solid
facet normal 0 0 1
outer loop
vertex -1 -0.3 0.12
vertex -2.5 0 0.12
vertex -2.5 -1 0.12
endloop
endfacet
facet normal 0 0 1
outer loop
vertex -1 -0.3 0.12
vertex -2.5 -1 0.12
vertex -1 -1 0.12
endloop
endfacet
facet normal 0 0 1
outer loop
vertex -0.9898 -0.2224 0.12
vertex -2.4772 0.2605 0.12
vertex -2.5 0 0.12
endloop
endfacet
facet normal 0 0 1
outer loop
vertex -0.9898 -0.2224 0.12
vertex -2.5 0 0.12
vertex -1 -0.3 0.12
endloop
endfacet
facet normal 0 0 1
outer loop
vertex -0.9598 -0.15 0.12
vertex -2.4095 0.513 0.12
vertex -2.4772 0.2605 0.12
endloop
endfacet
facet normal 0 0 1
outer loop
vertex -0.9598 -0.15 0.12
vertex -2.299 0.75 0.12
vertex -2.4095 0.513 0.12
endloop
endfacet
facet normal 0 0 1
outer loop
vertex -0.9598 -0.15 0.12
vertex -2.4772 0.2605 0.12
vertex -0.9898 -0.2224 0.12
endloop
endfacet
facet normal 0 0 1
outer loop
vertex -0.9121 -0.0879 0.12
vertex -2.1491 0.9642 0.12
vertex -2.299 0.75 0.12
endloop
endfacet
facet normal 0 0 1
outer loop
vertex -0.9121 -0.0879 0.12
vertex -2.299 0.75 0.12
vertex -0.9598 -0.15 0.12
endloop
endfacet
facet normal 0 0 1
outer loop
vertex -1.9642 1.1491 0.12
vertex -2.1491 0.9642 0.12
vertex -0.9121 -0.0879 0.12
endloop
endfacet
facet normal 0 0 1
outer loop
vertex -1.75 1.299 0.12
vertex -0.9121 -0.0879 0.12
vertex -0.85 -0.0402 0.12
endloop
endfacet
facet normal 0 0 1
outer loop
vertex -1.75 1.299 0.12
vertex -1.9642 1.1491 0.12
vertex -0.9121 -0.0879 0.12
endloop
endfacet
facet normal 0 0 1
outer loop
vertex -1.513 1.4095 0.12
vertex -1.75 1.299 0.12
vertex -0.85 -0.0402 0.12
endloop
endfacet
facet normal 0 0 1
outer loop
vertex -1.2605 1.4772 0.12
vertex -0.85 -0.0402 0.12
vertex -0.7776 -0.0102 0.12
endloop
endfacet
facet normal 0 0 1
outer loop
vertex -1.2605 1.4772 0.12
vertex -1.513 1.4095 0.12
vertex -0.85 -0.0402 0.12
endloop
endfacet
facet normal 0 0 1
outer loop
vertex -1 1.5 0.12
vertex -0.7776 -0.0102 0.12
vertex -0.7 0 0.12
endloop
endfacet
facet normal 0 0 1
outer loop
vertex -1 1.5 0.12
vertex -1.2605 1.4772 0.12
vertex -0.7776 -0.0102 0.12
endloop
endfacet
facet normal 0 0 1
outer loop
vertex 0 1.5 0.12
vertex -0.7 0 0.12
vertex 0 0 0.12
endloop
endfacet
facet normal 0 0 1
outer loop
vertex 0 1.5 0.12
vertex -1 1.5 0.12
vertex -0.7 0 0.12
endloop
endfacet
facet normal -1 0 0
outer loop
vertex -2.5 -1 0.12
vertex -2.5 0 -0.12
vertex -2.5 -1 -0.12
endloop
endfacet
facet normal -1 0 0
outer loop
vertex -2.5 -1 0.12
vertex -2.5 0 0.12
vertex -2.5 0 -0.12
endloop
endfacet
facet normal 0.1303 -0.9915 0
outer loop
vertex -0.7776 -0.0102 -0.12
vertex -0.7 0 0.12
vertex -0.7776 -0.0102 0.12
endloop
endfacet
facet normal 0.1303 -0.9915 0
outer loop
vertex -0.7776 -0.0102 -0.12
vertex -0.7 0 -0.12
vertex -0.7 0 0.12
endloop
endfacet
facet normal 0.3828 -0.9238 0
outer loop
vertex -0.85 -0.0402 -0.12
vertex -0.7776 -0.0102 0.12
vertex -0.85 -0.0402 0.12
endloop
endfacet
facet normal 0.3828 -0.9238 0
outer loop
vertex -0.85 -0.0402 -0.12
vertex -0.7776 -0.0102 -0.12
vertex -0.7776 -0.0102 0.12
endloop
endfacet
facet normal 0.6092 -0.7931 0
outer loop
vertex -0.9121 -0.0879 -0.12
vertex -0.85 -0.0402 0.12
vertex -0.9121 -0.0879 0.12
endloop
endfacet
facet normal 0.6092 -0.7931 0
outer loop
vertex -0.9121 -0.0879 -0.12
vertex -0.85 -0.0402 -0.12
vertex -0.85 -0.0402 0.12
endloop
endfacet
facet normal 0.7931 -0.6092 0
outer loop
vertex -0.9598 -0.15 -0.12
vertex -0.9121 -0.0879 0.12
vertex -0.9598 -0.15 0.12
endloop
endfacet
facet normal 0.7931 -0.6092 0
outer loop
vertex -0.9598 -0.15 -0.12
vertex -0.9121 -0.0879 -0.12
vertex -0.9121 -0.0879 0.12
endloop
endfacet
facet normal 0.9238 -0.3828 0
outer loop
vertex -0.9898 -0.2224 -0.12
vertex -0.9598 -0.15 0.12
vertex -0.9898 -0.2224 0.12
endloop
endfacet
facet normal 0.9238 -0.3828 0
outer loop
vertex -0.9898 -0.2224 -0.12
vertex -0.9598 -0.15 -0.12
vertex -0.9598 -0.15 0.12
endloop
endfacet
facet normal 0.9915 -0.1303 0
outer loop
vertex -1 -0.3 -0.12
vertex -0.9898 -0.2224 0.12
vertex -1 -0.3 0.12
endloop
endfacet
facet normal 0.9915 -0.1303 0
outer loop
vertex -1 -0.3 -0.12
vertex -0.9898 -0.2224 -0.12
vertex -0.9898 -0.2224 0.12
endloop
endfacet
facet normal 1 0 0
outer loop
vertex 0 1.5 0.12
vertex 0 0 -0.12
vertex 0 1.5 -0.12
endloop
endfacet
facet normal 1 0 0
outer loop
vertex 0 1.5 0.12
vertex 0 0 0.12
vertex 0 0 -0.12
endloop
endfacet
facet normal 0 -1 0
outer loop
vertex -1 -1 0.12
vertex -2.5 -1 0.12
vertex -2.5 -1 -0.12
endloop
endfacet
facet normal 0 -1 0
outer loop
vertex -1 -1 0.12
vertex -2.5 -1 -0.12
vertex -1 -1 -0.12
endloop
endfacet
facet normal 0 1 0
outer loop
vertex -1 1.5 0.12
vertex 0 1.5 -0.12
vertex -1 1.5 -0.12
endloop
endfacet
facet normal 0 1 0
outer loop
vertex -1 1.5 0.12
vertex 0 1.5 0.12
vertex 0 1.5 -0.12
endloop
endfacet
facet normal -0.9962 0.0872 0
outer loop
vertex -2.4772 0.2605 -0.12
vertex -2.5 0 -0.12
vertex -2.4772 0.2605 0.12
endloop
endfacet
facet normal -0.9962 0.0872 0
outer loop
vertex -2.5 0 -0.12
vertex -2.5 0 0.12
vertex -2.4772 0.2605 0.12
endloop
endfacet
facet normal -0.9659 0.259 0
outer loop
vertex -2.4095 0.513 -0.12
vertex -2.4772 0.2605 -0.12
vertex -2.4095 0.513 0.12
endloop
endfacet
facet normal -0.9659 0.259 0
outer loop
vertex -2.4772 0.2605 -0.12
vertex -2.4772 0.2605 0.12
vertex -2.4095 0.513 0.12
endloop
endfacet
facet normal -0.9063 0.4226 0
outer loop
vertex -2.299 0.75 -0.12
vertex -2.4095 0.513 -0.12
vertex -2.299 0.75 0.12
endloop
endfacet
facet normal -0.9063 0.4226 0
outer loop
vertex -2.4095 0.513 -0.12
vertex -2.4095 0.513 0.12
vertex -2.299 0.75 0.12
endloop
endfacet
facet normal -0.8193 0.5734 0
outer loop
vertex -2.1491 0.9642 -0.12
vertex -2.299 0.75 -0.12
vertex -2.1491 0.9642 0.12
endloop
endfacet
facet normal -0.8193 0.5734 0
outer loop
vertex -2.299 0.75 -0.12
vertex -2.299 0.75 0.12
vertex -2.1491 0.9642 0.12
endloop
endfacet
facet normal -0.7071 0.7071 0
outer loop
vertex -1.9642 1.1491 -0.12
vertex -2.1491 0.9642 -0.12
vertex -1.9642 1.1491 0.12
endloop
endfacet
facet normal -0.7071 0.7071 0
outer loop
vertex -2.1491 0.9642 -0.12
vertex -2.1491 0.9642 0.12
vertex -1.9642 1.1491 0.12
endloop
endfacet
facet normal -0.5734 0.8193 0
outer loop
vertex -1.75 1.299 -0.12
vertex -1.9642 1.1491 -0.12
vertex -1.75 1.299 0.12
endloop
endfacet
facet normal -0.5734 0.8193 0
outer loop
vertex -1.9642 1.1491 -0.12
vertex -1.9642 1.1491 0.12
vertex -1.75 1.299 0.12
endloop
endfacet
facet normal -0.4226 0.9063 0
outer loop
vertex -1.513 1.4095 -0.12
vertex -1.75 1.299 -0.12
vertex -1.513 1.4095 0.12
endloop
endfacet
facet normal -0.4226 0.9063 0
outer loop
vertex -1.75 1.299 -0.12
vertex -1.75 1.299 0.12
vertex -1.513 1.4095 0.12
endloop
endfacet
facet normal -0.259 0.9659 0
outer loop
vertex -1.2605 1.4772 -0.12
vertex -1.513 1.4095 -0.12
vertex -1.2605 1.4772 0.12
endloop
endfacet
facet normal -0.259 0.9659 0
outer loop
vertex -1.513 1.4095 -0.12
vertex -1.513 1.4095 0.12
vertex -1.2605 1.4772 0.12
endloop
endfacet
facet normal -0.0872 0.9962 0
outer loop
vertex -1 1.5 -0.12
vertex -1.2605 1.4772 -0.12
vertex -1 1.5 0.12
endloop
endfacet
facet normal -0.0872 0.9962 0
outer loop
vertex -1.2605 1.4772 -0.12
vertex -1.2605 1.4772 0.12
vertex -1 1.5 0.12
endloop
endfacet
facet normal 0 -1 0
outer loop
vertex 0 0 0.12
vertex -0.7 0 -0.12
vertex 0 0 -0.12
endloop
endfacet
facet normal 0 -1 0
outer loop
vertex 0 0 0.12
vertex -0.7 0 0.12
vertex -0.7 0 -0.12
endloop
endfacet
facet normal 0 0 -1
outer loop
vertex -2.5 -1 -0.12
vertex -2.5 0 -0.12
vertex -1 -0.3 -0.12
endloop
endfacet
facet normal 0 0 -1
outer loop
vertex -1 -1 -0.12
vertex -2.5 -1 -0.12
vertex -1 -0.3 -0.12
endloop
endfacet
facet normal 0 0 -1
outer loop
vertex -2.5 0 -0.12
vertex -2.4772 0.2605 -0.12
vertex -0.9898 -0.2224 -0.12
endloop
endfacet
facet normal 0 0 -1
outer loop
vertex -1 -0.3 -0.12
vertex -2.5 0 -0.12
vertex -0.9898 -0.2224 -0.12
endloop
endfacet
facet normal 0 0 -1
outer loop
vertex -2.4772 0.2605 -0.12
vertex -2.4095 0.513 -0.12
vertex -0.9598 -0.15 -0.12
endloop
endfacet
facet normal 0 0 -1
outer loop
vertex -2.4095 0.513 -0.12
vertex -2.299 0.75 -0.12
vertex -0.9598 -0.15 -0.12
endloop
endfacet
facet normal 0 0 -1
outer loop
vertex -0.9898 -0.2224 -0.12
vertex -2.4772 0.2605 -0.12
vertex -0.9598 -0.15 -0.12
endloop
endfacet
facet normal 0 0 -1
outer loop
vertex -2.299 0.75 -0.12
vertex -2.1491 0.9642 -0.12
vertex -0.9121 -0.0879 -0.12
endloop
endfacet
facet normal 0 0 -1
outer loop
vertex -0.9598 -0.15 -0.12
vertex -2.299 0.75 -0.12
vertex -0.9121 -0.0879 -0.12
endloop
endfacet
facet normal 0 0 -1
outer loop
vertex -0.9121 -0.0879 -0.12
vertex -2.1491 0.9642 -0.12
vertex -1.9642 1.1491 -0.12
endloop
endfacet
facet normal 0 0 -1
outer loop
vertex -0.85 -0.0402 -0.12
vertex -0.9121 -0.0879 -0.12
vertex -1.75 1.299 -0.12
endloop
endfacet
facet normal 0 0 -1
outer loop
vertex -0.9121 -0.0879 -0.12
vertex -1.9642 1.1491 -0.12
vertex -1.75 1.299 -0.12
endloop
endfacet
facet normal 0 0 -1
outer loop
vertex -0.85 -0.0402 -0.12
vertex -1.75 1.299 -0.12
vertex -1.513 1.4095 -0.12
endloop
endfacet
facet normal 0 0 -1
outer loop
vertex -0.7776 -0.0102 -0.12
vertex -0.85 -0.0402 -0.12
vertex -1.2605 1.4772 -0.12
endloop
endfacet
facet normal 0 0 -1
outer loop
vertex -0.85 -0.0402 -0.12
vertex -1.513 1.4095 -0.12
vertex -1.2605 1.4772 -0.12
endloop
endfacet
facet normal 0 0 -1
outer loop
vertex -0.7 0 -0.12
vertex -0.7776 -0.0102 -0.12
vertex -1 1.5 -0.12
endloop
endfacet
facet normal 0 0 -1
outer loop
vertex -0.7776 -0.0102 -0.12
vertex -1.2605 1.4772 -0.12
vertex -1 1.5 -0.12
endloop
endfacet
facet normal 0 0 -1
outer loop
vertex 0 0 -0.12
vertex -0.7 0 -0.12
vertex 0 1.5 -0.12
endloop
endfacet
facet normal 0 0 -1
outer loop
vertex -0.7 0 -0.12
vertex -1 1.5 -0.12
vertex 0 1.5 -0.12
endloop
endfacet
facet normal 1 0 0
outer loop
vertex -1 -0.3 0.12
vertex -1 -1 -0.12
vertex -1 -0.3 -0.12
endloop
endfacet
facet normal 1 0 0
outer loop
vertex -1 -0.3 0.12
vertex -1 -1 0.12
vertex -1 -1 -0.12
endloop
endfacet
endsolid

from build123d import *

# Parameters (mm, degrees)
BOSS_EXTRUDE1_DEPTH = 0.12
FILLET1_R           = 1.5
FILLET2_R           = 0.3


with BuildPart() as part:
    # Sketch1 → Boss-Extrude1 (new, symmetric)
    with BuildSketch(Plane.XY):
        Polygon((0, 0), (0, 1.5), (-2.5, 1.5), (-2.5, -1), (-1, -1), (-1, 0), align=None)
    extrude(amount=BOSS_EXTRUDE1_DEPTH, both=True)

    # Fillet1
    fillet1_edges = [part.edges().sort_by_distance(p)[0] for p in [
        (-2.5, 1.5, 0),
    ]]
    fillet(fillet1_edges, radius=FILLET1_R)

    # Fillet2
    fillet2_edges = [part.edges().sort_by_distance(p)[0] for p in [
        (-1, 0, 0),
    ]]
    fillet(fillet2_edges, radius=FILLET2_R)


solid = part.part
